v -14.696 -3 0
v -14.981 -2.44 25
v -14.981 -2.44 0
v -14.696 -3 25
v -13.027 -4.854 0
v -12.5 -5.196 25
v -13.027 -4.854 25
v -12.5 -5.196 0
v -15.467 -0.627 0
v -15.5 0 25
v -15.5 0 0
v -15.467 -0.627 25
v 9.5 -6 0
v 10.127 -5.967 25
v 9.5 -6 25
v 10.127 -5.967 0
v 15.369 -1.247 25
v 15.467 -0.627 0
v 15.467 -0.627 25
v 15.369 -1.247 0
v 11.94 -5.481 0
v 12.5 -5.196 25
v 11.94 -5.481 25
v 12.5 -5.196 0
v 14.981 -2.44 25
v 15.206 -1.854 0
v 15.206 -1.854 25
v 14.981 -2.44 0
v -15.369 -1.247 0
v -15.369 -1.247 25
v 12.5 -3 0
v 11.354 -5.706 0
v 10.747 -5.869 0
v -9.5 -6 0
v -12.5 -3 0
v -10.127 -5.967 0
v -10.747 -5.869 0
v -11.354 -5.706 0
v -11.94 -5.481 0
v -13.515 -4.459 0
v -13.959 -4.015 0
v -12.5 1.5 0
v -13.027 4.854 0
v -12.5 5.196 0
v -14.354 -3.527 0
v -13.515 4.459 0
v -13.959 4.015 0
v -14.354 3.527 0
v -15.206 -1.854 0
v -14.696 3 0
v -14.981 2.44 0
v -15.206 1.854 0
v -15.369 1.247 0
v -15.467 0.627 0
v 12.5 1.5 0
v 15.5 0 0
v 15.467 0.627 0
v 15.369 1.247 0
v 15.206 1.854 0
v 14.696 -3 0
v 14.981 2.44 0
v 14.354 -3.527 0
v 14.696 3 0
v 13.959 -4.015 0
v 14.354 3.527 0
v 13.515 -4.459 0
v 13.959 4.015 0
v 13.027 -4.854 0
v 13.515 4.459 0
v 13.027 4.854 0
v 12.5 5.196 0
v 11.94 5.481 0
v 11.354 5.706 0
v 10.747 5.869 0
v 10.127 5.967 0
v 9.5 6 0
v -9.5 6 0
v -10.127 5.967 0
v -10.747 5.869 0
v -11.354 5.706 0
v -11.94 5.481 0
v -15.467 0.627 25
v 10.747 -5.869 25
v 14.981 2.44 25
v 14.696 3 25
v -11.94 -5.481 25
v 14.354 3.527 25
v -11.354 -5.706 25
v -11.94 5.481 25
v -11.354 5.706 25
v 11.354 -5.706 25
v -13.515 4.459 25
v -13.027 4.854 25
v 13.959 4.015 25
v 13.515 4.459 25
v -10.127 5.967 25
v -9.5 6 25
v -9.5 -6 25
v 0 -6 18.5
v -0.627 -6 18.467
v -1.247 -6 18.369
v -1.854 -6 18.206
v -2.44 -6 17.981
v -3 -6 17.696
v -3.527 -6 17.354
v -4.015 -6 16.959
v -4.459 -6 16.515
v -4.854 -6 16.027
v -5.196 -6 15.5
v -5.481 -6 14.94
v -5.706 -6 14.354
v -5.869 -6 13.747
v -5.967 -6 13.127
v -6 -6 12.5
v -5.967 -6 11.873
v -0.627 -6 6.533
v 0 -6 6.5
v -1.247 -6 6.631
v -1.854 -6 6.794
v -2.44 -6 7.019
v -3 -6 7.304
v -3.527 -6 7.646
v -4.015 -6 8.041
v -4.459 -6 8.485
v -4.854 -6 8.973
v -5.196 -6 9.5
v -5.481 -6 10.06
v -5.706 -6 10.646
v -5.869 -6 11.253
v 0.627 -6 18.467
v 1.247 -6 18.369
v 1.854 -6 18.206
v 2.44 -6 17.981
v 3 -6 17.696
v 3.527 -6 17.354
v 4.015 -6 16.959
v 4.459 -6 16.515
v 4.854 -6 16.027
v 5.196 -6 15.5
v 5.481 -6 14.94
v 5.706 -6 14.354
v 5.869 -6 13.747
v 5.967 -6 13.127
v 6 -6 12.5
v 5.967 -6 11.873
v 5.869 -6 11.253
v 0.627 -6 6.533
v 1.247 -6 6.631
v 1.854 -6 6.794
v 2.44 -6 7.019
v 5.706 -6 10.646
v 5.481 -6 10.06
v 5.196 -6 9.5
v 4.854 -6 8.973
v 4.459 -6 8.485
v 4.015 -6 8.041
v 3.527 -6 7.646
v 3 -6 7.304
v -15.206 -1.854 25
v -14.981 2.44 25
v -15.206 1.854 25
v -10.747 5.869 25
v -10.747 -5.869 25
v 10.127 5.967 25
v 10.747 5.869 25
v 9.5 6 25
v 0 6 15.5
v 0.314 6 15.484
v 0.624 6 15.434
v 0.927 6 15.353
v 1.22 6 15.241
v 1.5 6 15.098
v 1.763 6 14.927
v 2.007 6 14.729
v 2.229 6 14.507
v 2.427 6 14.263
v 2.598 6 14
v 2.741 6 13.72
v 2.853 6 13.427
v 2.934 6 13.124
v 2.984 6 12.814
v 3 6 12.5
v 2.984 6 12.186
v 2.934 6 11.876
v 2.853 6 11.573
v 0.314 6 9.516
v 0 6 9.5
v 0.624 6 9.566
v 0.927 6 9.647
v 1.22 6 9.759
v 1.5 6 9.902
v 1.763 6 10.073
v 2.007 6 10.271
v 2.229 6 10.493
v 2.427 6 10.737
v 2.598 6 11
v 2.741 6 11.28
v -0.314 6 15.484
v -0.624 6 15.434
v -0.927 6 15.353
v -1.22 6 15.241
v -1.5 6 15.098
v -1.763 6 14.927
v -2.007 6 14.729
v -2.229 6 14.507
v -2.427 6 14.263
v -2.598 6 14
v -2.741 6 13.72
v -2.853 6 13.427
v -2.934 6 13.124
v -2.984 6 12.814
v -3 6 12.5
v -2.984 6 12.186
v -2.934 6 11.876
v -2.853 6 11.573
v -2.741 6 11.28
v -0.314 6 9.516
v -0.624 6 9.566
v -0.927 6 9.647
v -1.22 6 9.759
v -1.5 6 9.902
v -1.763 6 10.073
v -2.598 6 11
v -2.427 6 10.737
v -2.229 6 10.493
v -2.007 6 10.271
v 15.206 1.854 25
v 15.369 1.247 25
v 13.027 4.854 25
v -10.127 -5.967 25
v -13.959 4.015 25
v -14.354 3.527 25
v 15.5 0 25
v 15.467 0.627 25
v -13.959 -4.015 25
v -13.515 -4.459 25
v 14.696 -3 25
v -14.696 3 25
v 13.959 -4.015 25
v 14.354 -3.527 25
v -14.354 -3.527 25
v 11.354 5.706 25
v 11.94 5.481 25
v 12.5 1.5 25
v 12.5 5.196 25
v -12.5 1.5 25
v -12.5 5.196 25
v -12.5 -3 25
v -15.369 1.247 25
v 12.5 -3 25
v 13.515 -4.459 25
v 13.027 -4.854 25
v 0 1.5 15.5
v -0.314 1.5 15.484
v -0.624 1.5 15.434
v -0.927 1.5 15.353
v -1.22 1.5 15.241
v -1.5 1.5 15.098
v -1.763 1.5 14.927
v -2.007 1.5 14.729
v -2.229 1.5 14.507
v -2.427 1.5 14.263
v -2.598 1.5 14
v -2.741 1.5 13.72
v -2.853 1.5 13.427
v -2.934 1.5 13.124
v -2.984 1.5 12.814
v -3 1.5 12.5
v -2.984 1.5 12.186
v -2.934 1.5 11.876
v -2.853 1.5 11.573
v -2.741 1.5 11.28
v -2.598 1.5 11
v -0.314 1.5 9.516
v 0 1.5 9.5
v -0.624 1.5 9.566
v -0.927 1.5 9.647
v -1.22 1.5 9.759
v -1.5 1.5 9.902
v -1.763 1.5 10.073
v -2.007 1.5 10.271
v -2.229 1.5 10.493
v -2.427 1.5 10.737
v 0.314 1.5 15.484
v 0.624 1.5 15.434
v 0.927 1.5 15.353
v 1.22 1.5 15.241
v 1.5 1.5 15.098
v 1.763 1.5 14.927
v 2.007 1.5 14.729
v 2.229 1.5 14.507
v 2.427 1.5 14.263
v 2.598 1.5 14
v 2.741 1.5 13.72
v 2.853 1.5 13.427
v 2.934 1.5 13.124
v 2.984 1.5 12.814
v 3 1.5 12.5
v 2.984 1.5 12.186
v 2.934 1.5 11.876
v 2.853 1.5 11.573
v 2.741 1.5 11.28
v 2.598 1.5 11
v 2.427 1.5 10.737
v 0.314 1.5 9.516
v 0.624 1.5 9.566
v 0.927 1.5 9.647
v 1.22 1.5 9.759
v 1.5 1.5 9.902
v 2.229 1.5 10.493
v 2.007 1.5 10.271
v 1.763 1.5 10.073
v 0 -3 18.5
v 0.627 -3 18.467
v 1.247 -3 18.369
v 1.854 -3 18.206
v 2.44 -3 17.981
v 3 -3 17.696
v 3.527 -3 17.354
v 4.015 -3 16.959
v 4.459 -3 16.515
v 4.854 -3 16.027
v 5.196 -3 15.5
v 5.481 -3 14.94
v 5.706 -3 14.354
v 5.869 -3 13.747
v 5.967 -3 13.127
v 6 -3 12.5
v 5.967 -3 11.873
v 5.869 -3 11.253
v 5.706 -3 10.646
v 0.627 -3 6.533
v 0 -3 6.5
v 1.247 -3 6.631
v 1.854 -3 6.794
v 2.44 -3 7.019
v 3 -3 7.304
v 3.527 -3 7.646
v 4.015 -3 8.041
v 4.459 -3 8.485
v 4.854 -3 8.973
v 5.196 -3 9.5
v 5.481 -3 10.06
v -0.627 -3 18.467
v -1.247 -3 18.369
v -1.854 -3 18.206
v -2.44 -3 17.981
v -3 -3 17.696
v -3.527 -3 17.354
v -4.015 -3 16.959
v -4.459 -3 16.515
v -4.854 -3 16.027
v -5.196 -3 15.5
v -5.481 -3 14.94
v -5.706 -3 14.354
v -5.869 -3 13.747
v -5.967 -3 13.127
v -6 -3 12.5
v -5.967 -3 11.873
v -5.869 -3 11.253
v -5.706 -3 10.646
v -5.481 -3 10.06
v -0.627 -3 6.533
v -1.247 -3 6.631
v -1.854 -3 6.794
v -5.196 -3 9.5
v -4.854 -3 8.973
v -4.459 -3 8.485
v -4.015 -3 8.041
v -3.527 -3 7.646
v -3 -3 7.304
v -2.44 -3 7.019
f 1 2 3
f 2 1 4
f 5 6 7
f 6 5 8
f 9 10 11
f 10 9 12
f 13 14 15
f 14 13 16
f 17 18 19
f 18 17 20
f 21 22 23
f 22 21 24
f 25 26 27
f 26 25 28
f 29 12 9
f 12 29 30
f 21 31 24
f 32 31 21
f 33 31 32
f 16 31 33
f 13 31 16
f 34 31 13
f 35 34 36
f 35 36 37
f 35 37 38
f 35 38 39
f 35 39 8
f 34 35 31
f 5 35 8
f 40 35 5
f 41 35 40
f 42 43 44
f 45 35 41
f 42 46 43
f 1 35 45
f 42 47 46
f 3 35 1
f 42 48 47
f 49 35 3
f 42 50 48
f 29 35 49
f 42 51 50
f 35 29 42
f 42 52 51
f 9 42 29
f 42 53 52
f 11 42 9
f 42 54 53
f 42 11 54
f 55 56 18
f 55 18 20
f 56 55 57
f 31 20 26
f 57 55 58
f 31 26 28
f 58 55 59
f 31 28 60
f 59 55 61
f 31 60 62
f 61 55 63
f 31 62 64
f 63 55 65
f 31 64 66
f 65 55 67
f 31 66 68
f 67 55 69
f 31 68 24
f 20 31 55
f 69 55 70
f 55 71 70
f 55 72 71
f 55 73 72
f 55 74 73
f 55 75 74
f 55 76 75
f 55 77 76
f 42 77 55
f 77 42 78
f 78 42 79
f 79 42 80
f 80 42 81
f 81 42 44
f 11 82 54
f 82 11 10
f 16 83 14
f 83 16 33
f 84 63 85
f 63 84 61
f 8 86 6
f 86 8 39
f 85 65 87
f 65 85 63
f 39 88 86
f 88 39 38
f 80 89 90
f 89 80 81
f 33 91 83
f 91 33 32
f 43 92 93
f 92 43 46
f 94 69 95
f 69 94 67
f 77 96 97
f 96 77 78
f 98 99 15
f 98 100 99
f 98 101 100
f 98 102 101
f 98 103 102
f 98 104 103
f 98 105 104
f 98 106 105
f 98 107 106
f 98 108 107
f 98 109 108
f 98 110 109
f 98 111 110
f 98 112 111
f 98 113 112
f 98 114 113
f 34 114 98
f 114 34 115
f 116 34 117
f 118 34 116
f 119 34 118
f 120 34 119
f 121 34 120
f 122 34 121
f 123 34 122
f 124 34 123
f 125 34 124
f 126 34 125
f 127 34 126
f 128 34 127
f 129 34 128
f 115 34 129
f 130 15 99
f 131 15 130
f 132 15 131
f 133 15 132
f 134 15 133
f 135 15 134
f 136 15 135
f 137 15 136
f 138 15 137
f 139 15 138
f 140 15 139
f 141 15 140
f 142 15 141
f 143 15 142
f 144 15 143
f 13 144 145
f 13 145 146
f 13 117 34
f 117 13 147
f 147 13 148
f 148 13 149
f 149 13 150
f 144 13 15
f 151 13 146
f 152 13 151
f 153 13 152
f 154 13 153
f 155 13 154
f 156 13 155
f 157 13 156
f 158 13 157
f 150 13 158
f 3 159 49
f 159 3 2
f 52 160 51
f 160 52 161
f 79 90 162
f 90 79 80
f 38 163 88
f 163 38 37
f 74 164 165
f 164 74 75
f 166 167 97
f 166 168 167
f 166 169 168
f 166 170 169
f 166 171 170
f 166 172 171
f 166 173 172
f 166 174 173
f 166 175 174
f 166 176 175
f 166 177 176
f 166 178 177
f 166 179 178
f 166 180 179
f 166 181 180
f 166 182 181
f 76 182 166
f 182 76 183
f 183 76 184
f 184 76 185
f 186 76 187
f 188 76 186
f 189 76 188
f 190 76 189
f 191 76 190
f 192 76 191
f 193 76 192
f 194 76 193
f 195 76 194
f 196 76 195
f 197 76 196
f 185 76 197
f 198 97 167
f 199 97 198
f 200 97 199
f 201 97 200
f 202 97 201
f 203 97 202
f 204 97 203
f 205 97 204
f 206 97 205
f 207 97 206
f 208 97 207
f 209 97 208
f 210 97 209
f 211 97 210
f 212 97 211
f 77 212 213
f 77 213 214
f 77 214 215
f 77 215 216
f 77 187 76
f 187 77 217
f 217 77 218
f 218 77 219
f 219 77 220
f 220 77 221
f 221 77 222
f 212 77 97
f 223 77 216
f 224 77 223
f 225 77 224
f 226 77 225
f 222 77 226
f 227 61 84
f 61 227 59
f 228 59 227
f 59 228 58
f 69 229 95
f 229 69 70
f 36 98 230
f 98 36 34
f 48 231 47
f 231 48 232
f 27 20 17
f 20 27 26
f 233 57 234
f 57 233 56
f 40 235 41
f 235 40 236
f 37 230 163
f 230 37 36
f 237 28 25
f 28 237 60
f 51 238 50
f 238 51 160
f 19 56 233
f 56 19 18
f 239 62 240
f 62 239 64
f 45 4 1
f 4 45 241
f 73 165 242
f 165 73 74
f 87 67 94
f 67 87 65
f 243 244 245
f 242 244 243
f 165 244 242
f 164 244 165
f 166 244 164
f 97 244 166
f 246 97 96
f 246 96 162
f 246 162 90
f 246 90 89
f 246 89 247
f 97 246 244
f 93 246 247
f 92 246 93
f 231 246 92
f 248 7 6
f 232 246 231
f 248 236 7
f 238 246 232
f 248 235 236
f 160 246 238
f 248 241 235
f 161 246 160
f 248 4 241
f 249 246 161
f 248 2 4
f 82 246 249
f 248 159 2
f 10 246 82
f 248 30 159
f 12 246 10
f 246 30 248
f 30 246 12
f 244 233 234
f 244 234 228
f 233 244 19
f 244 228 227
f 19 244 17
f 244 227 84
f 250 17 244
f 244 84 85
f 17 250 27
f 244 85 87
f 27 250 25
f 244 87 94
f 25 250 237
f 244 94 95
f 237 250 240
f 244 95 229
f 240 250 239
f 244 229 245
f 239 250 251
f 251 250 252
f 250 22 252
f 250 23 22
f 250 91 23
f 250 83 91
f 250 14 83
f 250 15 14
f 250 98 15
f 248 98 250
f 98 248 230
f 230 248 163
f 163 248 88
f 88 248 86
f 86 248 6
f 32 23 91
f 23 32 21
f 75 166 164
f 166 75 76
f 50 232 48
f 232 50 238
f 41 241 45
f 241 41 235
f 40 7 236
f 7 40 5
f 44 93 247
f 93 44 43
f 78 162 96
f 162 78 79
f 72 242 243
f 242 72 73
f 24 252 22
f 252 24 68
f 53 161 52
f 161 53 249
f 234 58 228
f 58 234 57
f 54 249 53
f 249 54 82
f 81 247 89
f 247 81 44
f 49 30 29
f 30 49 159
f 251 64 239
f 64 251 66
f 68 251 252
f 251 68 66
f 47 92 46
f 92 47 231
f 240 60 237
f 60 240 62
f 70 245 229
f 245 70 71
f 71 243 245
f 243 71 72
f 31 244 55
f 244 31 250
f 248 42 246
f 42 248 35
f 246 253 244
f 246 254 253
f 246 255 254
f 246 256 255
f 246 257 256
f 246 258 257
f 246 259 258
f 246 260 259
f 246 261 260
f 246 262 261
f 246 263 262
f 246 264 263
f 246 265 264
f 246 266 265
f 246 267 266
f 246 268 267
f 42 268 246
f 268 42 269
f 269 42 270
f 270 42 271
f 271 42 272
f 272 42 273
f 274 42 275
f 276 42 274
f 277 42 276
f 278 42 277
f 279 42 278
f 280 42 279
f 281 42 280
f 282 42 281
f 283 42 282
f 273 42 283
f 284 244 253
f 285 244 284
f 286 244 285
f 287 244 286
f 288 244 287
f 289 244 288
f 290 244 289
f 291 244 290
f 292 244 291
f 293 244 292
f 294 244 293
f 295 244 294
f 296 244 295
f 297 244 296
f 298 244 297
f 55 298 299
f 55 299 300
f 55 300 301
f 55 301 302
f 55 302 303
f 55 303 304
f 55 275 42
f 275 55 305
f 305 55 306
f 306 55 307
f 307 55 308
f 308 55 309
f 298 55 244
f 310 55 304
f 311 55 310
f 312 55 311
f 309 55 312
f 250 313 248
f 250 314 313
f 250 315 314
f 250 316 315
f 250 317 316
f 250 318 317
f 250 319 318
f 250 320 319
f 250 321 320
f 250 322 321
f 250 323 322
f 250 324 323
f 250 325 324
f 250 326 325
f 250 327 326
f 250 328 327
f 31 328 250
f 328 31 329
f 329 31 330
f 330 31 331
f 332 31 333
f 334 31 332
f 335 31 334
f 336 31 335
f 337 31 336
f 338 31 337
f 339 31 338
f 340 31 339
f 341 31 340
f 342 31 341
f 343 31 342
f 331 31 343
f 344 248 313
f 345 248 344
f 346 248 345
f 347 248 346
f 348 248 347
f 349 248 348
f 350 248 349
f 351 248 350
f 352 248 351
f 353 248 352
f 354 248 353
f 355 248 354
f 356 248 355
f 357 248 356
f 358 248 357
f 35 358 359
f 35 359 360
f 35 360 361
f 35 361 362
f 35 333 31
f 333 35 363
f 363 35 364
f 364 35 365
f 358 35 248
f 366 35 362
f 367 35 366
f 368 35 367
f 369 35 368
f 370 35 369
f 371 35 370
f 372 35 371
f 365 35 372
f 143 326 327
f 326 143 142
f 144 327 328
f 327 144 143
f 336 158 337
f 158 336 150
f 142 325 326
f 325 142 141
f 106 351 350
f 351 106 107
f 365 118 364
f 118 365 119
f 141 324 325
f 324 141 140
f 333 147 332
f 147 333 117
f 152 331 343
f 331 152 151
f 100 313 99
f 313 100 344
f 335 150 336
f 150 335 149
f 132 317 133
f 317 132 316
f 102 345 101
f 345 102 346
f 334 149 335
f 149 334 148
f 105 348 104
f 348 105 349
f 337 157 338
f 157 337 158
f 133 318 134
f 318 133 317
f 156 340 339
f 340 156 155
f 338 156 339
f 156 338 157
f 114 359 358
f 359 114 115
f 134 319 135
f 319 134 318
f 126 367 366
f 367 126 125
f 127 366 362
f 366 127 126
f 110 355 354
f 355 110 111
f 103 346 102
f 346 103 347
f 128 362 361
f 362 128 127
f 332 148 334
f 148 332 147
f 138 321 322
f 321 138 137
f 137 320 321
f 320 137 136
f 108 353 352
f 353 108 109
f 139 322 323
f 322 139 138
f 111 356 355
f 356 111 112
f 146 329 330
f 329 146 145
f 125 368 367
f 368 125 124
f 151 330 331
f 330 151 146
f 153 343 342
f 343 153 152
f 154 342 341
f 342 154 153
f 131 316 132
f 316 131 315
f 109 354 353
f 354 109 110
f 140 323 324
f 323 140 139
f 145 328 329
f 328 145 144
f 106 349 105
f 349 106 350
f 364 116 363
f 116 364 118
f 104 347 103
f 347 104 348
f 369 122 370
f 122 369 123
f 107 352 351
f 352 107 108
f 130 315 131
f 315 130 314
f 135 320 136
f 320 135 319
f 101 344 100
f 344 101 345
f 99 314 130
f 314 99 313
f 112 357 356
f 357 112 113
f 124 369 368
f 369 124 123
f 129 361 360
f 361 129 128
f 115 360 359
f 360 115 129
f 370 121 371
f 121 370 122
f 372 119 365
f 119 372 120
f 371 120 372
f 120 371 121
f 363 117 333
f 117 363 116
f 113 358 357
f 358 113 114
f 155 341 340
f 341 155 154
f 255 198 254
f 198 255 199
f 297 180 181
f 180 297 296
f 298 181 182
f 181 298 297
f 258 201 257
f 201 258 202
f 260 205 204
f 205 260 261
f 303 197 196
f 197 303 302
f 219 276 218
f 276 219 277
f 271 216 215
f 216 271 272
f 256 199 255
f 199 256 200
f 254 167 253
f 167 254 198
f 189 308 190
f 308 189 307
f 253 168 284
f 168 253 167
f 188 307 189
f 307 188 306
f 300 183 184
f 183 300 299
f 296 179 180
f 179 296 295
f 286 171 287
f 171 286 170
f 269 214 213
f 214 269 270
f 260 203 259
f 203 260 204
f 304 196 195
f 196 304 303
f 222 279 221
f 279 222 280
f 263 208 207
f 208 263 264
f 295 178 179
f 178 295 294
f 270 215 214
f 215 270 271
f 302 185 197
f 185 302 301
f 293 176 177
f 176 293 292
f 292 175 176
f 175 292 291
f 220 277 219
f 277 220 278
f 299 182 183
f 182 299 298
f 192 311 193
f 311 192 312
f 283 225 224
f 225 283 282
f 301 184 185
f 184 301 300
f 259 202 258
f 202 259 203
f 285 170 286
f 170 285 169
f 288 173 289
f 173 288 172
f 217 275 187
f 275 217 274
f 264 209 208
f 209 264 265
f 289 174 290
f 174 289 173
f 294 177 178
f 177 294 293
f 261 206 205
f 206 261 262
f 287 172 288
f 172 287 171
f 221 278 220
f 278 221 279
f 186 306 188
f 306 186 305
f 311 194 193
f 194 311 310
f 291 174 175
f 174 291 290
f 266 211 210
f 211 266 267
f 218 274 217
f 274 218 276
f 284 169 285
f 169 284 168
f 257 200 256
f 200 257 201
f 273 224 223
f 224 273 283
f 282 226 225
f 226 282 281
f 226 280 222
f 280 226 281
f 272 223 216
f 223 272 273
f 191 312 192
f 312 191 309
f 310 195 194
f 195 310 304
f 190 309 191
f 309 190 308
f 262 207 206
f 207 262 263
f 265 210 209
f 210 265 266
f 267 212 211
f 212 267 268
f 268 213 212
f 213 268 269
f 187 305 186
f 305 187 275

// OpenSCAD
$fn=60;

tape_mount();

module tape_mount(height=25){
    difference(){
        hull() for(X=[-1,1]) translate([9.5*X, 0, 0])
            cylinder(h=height, d=12);
        translate([-12.5, -3, -1]) cube([25, 4.5, height+2]);
//        translate([-12.5, 1.5, 0]) %cube([25, 4.5, height+2]);
        translate([0, 0, height/2]) rotate([90,0,0]) 
            cylinder(d=12, h=8);
        translate([0, 8, height/2]) rotate([90,0,0]) 
            cylinder(d=6, h=20);
    }
}
